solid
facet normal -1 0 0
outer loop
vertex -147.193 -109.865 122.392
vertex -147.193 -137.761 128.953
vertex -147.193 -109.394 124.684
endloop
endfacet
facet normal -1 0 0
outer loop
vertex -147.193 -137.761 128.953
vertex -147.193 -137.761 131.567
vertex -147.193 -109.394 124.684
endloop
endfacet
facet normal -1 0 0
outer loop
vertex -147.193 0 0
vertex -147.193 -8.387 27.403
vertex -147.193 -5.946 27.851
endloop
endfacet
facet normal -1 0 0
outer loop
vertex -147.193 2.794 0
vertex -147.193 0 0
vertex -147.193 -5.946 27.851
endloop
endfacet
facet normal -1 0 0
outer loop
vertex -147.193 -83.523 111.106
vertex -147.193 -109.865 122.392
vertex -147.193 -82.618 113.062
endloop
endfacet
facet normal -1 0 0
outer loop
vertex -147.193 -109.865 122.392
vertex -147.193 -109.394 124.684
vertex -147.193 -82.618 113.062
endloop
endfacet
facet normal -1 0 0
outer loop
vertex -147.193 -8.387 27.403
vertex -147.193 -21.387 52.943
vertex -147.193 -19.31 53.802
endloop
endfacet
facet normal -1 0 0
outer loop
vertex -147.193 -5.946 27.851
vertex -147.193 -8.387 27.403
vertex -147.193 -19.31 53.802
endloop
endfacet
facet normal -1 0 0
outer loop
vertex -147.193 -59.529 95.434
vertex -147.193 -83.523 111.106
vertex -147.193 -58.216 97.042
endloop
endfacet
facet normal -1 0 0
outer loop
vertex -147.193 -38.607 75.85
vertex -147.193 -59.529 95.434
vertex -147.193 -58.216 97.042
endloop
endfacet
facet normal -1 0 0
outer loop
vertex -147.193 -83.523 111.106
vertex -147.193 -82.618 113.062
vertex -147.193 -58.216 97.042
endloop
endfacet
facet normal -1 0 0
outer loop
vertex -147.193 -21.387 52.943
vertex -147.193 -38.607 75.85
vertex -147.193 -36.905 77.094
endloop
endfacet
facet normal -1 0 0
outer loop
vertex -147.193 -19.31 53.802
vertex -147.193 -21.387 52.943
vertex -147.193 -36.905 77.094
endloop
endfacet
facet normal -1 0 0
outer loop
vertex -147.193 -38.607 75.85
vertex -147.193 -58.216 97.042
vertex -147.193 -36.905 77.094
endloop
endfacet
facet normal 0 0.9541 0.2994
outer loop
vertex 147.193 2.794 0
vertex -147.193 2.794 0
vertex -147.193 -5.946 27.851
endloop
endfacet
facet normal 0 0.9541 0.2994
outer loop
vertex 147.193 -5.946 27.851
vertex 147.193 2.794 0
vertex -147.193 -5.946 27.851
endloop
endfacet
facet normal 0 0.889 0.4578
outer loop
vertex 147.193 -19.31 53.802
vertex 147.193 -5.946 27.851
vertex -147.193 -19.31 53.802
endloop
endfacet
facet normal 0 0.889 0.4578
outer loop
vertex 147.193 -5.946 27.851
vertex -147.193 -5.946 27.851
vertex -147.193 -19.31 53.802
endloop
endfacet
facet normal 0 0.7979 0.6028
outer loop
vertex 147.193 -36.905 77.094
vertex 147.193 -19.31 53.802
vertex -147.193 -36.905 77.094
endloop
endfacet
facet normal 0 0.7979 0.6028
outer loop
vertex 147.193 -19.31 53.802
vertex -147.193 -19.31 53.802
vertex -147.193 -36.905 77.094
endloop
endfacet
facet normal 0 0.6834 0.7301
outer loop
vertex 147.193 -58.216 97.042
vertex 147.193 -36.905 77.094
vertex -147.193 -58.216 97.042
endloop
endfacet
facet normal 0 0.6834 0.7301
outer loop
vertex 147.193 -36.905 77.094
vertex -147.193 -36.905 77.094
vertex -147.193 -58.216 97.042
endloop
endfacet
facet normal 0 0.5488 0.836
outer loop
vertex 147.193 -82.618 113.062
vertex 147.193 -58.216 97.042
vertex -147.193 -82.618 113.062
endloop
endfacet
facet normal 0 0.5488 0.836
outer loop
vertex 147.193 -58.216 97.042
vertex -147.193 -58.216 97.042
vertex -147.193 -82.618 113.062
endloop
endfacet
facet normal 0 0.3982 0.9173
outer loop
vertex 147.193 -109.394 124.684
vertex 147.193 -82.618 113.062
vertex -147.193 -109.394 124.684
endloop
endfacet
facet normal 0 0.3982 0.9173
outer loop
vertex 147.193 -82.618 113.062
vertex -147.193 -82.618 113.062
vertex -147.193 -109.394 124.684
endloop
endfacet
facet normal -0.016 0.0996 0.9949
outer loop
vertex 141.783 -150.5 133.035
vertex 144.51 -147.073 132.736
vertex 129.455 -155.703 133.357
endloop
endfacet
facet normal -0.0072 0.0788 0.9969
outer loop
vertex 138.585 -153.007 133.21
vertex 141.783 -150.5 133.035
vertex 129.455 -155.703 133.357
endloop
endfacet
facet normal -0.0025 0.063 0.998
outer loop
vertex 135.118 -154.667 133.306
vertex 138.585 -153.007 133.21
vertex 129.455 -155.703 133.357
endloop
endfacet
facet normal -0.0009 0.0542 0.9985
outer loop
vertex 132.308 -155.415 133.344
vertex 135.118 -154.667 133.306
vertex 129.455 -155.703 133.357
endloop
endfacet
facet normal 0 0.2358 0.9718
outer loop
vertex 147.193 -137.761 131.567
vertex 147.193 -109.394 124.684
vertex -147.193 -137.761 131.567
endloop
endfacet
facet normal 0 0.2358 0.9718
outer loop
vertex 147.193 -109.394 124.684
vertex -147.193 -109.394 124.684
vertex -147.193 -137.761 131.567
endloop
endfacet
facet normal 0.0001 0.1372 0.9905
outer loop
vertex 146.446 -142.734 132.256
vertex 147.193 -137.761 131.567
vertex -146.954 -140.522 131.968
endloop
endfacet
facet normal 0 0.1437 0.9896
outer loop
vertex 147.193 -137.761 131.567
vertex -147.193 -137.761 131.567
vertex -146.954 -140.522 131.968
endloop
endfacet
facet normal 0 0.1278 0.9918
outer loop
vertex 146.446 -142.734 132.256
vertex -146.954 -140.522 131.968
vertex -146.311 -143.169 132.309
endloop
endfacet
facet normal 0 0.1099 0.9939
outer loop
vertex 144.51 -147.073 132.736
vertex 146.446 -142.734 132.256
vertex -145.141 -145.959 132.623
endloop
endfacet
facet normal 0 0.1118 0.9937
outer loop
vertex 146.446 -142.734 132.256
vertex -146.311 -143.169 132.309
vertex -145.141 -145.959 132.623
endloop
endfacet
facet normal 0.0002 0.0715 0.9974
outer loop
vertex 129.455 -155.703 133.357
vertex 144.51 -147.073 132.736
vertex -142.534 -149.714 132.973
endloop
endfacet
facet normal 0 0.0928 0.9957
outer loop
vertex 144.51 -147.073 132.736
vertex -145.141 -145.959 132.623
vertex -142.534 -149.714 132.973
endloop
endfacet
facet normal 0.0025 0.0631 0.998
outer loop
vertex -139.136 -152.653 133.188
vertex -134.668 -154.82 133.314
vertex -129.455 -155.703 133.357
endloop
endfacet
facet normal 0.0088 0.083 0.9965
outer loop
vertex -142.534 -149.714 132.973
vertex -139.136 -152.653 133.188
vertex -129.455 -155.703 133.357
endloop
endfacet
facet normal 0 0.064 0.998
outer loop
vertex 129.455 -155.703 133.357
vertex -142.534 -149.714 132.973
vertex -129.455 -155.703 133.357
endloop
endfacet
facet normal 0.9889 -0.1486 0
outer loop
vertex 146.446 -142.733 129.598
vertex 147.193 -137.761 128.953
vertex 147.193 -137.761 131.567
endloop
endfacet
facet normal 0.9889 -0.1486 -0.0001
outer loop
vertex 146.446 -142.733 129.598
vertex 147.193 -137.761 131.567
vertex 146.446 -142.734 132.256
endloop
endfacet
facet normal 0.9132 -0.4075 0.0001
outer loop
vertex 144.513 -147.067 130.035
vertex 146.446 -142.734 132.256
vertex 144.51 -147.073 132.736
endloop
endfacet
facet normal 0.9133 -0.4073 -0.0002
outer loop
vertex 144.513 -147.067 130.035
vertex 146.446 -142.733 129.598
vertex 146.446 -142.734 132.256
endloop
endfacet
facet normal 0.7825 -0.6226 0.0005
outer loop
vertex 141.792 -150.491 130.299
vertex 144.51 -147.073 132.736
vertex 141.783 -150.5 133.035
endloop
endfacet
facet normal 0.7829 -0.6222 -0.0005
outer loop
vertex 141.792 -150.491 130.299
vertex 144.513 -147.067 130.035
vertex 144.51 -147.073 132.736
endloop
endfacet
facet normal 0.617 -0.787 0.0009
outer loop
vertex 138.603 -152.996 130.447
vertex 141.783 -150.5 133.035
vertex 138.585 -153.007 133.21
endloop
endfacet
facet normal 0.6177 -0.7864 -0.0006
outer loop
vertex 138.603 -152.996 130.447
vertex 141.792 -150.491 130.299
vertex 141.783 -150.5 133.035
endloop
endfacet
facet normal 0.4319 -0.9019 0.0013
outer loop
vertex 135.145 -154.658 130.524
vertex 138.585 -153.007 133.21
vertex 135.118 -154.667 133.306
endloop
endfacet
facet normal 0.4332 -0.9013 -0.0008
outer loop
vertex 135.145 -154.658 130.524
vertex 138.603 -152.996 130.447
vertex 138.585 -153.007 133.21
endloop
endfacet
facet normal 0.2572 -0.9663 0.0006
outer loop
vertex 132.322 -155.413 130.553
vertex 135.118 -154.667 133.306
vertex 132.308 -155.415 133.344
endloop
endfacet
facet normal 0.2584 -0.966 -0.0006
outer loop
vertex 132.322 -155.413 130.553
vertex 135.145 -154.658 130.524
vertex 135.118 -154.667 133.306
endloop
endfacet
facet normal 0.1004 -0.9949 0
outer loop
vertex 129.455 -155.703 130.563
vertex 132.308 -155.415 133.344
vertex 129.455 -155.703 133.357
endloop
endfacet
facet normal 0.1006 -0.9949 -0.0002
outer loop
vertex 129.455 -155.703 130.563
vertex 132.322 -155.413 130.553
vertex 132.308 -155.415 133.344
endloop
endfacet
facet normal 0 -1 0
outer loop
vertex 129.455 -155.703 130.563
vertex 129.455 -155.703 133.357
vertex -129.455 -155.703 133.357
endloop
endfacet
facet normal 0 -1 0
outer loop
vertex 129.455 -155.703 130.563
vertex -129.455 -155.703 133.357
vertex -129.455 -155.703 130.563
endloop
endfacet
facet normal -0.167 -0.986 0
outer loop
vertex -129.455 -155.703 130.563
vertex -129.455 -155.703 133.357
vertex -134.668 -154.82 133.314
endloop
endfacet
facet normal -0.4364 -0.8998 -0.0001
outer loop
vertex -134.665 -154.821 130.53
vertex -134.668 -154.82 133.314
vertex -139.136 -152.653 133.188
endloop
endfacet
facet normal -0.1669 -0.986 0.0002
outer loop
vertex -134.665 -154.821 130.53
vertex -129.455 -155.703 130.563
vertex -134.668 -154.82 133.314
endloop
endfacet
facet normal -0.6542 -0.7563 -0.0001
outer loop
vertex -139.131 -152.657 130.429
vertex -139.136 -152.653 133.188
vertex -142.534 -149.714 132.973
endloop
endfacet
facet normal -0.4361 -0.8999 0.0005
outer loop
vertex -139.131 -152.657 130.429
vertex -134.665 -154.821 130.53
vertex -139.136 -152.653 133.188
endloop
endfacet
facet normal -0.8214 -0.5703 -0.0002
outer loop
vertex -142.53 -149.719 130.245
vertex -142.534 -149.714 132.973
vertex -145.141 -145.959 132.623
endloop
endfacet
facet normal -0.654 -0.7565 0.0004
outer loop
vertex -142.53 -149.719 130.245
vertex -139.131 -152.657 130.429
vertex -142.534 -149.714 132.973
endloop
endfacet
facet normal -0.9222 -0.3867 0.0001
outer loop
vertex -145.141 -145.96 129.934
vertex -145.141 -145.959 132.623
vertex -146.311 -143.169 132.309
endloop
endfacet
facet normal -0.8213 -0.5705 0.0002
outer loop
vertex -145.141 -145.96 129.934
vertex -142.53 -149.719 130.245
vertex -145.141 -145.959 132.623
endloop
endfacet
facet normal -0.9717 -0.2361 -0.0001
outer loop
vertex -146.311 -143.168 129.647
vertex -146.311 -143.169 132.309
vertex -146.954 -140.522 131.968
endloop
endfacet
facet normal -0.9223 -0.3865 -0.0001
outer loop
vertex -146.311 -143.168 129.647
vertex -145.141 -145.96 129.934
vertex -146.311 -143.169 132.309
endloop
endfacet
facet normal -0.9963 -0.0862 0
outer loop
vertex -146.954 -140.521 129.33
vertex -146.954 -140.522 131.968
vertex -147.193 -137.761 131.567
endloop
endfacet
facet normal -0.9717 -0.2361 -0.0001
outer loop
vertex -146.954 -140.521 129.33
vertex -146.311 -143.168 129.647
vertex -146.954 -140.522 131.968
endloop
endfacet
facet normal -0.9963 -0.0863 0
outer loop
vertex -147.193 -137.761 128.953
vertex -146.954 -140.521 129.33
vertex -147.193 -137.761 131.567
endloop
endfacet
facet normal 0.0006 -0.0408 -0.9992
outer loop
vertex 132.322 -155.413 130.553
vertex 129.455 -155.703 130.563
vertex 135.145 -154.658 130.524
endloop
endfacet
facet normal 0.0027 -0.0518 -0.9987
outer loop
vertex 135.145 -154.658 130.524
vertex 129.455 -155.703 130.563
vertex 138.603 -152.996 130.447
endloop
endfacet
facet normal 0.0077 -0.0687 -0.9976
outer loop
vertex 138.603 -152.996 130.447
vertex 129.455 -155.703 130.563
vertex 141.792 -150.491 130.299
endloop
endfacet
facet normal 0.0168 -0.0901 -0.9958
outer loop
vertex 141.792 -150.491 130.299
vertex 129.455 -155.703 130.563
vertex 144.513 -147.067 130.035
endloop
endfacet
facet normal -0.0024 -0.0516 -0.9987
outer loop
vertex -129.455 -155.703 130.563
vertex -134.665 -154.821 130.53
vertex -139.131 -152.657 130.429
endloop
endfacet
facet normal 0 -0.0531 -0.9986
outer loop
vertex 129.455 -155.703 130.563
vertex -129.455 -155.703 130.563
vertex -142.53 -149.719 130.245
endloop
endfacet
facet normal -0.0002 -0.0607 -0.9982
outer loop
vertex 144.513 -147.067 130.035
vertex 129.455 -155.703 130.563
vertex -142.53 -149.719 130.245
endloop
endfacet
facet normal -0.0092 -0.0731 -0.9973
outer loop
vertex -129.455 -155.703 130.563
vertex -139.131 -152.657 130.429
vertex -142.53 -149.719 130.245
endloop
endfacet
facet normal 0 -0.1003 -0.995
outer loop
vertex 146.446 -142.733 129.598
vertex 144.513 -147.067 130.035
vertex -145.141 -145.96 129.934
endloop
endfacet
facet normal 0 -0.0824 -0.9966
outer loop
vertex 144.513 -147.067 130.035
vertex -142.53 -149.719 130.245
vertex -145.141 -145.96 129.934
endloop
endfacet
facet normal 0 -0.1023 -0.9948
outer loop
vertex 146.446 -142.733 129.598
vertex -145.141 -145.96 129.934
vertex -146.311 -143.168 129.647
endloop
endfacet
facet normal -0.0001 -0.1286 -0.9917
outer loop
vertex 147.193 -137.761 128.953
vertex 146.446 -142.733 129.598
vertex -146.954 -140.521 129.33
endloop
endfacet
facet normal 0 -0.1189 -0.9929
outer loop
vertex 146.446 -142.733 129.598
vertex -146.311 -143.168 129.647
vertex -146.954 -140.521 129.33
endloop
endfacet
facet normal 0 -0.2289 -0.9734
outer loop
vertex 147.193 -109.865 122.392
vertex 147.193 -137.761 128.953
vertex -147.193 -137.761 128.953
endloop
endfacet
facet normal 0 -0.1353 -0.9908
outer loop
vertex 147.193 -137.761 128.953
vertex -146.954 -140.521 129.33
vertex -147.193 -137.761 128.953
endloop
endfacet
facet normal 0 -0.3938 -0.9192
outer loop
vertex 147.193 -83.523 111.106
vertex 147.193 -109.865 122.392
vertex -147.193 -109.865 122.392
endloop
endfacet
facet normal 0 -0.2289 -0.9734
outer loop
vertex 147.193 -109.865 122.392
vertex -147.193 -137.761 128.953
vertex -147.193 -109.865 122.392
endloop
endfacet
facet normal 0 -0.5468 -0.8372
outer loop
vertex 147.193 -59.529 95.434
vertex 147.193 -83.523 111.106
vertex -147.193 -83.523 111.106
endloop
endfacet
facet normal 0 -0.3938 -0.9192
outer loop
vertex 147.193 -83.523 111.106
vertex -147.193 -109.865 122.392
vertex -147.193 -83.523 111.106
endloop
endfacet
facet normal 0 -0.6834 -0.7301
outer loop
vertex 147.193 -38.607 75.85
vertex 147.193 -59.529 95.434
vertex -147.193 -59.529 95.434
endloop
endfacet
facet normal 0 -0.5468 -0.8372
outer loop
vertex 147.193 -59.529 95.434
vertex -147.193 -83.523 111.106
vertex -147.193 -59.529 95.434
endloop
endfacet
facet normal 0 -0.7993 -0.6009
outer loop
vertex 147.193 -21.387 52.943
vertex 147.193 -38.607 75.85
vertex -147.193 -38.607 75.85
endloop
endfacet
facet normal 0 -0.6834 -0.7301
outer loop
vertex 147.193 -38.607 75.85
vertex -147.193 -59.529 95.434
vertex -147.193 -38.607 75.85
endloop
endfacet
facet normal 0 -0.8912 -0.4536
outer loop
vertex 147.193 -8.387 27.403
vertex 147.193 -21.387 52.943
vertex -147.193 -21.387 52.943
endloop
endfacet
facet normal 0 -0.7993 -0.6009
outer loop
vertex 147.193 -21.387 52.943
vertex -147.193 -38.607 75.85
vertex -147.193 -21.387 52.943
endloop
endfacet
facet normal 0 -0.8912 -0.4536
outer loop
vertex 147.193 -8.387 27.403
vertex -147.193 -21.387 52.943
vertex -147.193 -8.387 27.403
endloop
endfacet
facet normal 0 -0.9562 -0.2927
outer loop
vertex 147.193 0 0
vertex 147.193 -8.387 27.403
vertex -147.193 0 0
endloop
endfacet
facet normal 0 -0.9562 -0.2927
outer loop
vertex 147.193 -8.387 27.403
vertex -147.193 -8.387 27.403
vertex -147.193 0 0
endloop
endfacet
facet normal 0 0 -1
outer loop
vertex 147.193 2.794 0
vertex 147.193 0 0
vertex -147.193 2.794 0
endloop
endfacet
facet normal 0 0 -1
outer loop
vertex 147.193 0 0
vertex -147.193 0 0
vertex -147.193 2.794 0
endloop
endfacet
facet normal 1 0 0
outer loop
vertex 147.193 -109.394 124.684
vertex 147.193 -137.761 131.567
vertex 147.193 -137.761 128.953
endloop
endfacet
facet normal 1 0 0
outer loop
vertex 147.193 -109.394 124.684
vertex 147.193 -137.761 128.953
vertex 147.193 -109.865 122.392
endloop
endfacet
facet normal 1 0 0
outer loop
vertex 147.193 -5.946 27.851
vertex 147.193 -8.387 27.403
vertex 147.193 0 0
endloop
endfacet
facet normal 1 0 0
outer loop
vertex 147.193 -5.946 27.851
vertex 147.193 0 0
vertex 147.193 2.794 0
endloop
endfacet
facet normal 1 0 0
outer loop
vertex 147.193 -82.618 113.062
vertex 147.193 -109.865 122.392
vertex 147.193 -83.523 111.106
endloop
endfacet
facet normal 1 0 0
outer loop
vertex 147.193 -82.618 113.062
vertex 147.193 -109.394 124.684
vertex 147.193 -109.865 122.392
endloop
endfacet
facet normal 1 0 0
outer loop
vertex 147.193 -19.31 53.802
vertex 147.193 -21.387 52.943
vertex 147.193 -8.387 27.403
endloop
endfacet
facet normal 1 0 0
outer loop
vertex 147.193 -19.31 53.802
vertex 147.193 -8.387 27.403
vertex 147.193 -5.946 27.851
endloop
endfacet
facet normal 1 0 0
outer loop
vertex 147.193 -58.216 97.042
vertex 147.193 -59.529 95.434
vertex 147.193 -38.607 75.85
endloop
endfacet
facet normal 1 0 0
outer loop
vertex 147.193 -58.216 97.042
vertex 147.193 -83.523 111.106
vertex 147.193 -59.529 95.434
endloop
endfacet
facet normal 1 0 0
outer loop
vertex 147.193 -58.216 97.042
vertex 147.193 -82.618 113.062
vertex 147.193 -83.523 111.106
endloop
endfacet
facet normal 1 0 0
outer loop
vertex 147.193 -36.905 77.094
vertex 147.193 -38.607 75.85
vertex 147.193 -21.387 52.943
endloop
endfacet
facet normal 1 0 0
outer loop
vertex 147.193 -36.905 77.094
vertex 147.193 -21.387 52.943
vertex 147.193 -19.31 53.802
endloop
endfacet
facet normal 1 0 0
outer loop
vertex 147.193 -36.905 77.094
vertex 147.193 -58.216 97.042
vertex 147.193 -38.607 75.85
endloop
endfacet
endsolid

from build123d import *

# Parameters (mm, degrees)
F1_DEPTH      = 147.193
F1_DEPTH_BACK = 147.193
F3_DEPTH      = 186.182


# Not quite as in the source:
# - a length typed as a fraction of an inch, garbled in the dataset ("3 / 203.2 mm" for 3/8 in), is restored


with BuildPart() as f1:
    # F0 (on Right) → F1 (new body, two sides)
    with BuildSketch(Plane.YZ) as f1_sk:
        with BuildLine():
            ThreePointArc((-155.7030739649, 130.5633668295), (-55.3860759172, 92.0728226971), (0, 0))
            Line((0, 0), (2.794, 0))
            ThreePointArc((2.794, 0), (-53.8777768496, 93.5114749264), (-155.7030739649, 133.3573668295))
            Line((-155.7030739649, 133.3573668295), (-155.7030739649, 130.5633668295))
        make_face()
    extrude(amount=-F1_DEPTH)
    extrude(f1_sk.sketch, amount=F1_DEPTH_BACK)

    # F2 (on Top) → F3 (cut)
    with BuildSketch(Plane.XY):
        with BuildLine():
            ThreePointArc((-128.6797374487, -155.7030739649), (-141.8112510122, -150.4712953815), (-147.193, -137.4005290135))
            Line((-147.193, -137.4005290135), (-161.3427400589, -137.4005290135))
            Line((-161.3427400589, -137.4005290135), (-161.3427400589, -161.3346251115))
            Line((-161.3427400589, -161.3346251115), (-129.2428970337, -161.3346251115))
            Line((-129.2428970337, -161.3346251115), (-128.6797374487, -155.7030739649))
        make_face()
        with BuildLine():
            Line((128.6797374487, -155.7030739649), (129.2428970337, -161.3346251115))
            Line((129.2428970337, -161.3346251115), (161.3427400589, -161.3346251115))
            Line((161.3427400589, -161.3346251115), (161.3427400589, -137.4005290135))
            Line((161.3427400589, -137.4005290135), (147.193, -137.4005290135))
            ThreePointArc((147.193, -137.4005290135), (141.8112510122, -150.4712953815), (128.6797374487, -155.7030739649))
        make_face()
    extrude(amount=F3_DEPTH, mode=Mode.SUBTRACT)


solid = f1.part
